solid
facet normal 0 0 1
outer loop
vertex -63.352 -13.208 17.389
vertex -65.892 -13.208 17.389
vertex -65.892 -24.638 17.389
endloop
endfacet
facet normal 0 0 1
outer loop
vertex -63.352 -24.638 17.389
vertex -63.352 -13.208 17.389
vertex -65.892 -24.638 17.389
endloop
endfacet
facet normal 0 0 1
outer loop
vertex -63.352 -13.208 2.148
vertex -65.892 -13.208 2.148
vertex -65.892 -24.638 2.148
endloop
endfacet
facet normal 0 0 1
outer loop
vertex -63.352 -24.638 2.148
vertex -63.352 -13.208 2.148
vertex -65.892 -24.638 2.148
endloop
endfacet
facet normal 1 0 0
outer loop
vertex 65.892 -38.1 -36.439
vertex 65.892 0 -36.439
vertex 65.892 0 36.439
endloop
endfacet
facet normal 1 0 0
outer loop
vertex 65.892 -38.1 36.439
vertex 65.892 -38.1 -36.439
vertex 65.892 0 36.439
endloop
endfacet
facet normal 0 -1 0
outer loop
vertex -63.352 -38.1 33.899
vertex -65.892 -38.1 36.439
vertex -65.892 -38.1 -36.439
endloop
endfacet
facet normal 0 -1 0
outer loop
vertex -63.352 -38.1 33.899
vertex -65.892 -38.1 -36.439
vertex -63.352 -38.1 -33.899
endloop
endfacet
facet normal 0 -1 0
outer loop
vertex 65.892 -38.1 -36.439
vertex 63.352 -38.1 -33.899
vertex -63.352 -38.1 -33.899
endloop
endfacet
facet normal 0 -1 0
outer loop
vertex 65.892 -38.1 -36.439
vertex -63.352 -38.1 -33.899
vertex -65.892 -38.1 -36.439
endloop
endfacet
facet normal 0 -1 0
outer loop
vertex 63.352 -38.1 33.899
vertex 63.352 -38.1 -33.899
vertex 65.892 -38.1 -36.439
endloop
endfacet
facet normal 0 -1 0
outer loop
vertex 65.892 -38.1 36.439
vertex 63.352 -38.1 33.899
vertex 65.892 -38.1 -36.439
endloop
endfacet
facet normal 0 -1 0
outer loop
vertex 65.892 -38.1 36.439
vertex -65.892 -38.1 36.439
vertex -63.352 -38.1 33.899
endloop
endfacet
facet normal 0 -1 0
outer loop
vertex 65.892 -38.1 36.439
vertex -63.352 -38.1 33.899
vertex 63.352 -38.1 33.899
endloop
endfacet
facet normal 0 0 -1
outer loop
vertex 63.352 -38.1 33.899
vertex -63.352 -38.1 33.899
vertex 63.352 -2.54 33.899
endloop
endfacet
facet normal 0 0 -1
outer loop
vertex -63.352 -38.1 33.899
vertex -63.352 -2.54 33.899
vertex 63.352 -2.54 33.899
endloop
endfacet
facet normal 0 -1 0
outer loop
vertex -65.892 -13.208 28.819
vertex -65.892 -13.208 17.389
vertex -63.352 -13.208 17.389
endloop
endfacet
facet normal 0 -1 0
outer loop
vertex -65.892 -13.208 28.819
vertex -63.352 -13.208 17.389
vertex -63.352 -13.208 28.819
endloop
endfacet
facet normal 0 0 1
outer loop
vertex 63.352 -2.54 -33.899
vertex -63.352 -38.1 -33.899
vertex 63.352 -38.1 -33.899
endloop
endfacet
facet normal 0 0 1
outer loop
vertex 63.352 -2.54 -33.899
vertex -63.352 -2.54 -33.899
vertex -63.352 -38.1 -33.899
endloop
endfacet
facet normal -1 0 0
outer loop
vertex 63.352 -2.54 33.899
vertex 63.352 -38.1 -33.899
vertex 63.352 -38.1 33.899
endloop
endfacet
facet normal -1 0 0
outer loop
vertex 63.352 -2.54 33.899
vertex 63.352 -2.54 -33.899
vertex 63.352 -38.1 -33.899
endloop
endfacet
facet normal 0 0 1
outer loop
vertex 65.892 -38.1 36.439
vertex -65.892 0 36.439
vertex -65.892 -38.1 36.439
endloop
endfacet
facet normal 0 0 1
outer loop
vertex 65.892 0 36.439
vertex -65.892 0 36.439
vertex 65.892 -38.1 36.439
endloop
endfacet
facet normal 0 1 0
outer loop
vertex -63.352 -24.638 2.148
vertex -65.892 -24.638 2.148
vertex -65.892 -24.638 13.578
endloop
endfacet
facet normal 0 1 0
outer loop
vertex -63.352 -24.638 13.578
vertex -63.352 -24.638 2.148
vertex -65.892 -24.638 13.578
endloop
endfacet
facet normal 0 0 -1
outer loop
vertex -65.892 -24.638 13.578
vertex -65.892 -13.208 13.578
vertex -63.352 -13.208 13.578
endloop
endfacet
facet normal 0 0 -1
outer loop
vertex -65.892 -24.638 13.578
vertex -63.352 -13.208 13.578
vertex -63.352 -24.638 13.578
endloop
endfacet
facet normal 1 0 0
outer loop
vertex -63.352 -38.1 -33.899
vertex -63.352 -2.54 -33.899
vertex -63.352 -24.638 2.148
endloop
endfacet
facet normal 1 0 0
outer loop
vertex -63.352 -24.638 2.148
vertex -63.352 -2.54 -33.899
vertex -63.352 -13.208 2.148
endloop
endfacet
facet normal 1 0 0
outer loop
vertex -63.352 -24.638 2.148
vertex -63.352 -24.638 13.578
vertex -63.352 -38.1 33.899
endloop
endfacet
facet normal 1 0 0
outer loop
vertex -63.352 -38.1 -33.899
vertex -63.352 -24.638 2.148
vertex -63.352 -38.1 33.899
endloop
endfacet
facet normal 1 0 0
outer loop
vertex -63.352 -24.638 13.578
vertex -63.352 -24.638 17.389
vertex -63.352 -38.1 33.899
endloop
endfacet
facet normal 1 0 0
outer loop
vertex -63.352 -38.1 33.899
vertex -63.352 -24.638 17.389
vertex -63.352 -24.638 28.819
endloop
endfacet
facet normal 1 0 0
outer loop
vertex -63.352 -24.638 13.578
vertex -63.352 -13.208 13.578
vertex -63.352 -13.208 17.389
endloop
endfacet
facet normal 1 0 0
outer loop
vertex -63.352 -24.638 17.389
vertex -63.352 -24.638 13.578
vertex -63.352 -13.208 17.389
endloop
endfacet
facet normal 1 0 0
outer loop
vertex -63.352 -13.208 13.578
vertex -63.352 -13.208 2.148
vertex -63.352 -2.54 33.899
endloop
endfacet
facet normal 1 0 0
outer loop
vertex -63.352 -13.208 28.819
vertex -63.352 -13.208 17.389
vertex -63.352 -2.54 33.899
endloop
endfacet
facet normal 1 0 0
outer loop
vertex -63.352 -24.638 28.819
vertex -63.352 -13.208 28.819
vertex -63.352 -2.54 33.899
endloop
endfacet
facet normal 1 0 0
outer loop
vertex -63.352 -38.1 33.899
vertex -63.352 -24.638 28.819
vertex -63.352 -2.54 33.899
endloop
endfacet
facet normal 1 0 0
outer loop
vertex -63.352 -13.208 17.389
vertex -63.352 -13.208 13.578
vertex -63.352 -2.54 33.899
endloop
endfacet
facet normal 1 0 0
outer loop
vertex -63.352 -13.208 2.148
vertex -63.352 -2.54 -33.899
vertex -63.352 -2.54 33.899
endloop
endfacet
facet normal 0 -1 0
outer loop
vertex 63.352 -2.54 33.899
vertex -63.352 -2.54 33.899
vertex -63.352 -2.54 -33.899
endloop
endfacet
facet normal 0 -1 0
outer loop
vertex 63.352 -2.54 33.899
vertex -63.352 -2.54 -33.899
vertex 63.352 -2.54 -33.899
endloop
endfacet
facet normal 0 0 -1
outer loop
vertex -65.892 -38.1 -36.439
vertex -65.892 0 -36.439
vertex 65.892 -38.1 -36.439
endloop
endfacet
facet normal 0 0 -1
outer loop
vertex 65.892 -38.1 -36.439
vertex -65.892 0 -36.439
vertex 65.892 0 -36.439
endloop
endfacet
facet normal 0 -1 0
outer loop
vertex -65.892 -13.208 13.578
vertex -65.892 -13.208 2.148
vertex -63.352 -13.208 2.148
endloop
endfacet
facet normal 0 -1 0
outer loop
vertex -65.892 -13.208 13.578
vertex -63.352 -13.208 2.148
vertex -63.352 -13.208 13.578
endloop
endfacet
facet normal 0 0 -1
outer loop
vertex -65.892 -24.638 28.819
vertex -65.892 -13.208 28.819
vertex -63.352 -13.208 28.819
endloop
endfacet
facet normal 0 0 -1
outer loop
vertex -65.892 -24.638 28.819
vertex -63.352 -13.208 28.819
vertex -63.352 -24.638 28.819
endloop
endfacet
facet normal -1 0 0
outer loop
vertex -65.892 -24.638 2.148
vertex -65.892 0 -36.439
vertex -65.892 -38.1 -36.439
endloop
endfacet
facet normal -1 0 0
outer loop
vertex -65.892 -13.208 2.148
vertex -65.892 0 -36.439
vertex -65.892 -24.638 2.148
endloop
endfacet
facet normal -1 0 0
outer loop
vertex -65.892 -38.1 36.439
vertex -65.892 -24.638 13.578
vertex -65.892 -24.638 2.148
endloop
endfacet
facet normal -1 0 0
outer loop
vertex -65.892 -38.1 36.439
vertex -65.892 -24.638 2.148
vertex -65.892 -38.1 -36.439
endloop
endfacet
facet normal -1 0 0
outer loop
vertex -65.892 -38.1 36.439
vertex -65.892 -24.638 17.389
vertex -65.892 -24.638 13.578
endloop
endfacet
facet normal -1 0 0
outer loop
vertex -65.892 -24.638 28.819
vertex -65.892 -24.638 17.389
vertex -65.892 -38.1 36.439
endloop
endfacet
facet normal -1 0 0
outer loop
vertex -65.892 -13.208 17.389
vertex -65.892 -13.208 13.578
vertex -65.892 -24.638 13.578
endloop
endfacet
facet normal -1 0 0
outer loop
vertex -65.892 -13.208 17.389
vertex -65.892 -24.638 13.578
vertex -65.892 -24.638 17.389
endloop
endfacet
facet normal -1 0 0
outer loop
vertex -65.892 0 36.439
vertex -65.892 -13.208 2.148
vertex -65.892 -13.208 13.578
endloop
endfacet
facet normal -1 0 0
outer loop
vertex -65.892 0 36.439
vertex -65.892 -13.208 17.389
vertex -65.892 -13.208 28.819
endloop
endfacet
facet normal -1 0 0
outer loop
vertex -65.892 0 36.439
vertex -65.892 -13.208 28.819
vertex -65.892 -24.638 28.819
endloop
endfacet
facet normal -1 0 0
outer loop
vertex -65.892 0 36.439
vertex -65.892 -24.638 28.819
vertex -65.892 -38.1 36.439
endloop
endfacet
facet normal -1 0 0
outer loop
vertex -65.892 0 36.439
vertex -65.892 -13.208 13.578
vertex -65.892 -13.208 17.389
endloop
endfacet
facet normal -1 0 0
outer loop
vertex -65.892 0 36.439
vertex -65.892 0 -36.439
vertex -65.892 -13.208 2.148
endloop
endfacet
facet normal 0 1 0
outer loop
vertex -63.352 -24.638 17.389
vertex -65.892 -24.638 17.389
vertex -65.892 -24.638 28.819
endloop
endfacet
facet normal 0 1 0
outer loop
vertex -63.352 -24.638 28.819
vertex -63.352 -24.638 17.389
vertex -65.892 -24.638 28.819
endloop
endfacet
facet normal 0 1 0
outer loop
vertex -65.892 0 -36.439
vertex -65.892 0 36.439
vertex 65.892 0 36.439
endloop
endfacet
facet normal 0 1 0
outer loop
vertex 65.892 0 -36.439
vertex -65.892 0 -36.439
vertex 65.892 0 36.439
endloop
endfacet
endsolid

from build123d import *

# Parameters (mm, degrees)
F0_W     = 131.784498
F0_H     = 72.877914
F1_DEPTH = 38.1
F2_T     = -2.54
F3_W     = 11.43
F3_H     = 11.43
F4_DEPTH = 25.4
F5_W     = 11.43
F5_H     = 11.43
F6_DEPTH = 25.4


with BuildPart() as f1:
    # F0 (on Front) → F1 (new body)
    with BuildSketch(Plane.XZ):
        Rectangle(F0_W, F0_H)
    extrude(amount=F1_DEPTH)

    # F2
    f2_openings = [f1.faces().sort_by_distance(p)[0] for p in [
        (0, -38.1, 0),
    ]]
    offset(amount=F2_T, openings=f2_openings)

    # F3 (on face) → F4 (cut)
    with BuildSketch(Plane(origin=(-65.892249, 0, 0), x_dir=(0, -1, 0), z_dir=(-1, 0, 0))):
        with Locations((18.923, 23.103957)):
            Rectangle(F3_W, F3_H)
    extrude(amount=-F4_DEPTH, mode=Mode.SUBTRACT)

    # F5 (on face) → F6 (cut)
    with BuildSketch(Plane(origin=(-65.892249, 0, 0), x_dir=(0, -1, 0), z_dir=(-1, 0, 0))):
        with Locations((18.923, 7.863193)):
            Rectangle(F5_W, F5_H)
    extrude(amount=-F6_DEPTH, mode=Mode.SUBTRACT)


solid = f1.part
